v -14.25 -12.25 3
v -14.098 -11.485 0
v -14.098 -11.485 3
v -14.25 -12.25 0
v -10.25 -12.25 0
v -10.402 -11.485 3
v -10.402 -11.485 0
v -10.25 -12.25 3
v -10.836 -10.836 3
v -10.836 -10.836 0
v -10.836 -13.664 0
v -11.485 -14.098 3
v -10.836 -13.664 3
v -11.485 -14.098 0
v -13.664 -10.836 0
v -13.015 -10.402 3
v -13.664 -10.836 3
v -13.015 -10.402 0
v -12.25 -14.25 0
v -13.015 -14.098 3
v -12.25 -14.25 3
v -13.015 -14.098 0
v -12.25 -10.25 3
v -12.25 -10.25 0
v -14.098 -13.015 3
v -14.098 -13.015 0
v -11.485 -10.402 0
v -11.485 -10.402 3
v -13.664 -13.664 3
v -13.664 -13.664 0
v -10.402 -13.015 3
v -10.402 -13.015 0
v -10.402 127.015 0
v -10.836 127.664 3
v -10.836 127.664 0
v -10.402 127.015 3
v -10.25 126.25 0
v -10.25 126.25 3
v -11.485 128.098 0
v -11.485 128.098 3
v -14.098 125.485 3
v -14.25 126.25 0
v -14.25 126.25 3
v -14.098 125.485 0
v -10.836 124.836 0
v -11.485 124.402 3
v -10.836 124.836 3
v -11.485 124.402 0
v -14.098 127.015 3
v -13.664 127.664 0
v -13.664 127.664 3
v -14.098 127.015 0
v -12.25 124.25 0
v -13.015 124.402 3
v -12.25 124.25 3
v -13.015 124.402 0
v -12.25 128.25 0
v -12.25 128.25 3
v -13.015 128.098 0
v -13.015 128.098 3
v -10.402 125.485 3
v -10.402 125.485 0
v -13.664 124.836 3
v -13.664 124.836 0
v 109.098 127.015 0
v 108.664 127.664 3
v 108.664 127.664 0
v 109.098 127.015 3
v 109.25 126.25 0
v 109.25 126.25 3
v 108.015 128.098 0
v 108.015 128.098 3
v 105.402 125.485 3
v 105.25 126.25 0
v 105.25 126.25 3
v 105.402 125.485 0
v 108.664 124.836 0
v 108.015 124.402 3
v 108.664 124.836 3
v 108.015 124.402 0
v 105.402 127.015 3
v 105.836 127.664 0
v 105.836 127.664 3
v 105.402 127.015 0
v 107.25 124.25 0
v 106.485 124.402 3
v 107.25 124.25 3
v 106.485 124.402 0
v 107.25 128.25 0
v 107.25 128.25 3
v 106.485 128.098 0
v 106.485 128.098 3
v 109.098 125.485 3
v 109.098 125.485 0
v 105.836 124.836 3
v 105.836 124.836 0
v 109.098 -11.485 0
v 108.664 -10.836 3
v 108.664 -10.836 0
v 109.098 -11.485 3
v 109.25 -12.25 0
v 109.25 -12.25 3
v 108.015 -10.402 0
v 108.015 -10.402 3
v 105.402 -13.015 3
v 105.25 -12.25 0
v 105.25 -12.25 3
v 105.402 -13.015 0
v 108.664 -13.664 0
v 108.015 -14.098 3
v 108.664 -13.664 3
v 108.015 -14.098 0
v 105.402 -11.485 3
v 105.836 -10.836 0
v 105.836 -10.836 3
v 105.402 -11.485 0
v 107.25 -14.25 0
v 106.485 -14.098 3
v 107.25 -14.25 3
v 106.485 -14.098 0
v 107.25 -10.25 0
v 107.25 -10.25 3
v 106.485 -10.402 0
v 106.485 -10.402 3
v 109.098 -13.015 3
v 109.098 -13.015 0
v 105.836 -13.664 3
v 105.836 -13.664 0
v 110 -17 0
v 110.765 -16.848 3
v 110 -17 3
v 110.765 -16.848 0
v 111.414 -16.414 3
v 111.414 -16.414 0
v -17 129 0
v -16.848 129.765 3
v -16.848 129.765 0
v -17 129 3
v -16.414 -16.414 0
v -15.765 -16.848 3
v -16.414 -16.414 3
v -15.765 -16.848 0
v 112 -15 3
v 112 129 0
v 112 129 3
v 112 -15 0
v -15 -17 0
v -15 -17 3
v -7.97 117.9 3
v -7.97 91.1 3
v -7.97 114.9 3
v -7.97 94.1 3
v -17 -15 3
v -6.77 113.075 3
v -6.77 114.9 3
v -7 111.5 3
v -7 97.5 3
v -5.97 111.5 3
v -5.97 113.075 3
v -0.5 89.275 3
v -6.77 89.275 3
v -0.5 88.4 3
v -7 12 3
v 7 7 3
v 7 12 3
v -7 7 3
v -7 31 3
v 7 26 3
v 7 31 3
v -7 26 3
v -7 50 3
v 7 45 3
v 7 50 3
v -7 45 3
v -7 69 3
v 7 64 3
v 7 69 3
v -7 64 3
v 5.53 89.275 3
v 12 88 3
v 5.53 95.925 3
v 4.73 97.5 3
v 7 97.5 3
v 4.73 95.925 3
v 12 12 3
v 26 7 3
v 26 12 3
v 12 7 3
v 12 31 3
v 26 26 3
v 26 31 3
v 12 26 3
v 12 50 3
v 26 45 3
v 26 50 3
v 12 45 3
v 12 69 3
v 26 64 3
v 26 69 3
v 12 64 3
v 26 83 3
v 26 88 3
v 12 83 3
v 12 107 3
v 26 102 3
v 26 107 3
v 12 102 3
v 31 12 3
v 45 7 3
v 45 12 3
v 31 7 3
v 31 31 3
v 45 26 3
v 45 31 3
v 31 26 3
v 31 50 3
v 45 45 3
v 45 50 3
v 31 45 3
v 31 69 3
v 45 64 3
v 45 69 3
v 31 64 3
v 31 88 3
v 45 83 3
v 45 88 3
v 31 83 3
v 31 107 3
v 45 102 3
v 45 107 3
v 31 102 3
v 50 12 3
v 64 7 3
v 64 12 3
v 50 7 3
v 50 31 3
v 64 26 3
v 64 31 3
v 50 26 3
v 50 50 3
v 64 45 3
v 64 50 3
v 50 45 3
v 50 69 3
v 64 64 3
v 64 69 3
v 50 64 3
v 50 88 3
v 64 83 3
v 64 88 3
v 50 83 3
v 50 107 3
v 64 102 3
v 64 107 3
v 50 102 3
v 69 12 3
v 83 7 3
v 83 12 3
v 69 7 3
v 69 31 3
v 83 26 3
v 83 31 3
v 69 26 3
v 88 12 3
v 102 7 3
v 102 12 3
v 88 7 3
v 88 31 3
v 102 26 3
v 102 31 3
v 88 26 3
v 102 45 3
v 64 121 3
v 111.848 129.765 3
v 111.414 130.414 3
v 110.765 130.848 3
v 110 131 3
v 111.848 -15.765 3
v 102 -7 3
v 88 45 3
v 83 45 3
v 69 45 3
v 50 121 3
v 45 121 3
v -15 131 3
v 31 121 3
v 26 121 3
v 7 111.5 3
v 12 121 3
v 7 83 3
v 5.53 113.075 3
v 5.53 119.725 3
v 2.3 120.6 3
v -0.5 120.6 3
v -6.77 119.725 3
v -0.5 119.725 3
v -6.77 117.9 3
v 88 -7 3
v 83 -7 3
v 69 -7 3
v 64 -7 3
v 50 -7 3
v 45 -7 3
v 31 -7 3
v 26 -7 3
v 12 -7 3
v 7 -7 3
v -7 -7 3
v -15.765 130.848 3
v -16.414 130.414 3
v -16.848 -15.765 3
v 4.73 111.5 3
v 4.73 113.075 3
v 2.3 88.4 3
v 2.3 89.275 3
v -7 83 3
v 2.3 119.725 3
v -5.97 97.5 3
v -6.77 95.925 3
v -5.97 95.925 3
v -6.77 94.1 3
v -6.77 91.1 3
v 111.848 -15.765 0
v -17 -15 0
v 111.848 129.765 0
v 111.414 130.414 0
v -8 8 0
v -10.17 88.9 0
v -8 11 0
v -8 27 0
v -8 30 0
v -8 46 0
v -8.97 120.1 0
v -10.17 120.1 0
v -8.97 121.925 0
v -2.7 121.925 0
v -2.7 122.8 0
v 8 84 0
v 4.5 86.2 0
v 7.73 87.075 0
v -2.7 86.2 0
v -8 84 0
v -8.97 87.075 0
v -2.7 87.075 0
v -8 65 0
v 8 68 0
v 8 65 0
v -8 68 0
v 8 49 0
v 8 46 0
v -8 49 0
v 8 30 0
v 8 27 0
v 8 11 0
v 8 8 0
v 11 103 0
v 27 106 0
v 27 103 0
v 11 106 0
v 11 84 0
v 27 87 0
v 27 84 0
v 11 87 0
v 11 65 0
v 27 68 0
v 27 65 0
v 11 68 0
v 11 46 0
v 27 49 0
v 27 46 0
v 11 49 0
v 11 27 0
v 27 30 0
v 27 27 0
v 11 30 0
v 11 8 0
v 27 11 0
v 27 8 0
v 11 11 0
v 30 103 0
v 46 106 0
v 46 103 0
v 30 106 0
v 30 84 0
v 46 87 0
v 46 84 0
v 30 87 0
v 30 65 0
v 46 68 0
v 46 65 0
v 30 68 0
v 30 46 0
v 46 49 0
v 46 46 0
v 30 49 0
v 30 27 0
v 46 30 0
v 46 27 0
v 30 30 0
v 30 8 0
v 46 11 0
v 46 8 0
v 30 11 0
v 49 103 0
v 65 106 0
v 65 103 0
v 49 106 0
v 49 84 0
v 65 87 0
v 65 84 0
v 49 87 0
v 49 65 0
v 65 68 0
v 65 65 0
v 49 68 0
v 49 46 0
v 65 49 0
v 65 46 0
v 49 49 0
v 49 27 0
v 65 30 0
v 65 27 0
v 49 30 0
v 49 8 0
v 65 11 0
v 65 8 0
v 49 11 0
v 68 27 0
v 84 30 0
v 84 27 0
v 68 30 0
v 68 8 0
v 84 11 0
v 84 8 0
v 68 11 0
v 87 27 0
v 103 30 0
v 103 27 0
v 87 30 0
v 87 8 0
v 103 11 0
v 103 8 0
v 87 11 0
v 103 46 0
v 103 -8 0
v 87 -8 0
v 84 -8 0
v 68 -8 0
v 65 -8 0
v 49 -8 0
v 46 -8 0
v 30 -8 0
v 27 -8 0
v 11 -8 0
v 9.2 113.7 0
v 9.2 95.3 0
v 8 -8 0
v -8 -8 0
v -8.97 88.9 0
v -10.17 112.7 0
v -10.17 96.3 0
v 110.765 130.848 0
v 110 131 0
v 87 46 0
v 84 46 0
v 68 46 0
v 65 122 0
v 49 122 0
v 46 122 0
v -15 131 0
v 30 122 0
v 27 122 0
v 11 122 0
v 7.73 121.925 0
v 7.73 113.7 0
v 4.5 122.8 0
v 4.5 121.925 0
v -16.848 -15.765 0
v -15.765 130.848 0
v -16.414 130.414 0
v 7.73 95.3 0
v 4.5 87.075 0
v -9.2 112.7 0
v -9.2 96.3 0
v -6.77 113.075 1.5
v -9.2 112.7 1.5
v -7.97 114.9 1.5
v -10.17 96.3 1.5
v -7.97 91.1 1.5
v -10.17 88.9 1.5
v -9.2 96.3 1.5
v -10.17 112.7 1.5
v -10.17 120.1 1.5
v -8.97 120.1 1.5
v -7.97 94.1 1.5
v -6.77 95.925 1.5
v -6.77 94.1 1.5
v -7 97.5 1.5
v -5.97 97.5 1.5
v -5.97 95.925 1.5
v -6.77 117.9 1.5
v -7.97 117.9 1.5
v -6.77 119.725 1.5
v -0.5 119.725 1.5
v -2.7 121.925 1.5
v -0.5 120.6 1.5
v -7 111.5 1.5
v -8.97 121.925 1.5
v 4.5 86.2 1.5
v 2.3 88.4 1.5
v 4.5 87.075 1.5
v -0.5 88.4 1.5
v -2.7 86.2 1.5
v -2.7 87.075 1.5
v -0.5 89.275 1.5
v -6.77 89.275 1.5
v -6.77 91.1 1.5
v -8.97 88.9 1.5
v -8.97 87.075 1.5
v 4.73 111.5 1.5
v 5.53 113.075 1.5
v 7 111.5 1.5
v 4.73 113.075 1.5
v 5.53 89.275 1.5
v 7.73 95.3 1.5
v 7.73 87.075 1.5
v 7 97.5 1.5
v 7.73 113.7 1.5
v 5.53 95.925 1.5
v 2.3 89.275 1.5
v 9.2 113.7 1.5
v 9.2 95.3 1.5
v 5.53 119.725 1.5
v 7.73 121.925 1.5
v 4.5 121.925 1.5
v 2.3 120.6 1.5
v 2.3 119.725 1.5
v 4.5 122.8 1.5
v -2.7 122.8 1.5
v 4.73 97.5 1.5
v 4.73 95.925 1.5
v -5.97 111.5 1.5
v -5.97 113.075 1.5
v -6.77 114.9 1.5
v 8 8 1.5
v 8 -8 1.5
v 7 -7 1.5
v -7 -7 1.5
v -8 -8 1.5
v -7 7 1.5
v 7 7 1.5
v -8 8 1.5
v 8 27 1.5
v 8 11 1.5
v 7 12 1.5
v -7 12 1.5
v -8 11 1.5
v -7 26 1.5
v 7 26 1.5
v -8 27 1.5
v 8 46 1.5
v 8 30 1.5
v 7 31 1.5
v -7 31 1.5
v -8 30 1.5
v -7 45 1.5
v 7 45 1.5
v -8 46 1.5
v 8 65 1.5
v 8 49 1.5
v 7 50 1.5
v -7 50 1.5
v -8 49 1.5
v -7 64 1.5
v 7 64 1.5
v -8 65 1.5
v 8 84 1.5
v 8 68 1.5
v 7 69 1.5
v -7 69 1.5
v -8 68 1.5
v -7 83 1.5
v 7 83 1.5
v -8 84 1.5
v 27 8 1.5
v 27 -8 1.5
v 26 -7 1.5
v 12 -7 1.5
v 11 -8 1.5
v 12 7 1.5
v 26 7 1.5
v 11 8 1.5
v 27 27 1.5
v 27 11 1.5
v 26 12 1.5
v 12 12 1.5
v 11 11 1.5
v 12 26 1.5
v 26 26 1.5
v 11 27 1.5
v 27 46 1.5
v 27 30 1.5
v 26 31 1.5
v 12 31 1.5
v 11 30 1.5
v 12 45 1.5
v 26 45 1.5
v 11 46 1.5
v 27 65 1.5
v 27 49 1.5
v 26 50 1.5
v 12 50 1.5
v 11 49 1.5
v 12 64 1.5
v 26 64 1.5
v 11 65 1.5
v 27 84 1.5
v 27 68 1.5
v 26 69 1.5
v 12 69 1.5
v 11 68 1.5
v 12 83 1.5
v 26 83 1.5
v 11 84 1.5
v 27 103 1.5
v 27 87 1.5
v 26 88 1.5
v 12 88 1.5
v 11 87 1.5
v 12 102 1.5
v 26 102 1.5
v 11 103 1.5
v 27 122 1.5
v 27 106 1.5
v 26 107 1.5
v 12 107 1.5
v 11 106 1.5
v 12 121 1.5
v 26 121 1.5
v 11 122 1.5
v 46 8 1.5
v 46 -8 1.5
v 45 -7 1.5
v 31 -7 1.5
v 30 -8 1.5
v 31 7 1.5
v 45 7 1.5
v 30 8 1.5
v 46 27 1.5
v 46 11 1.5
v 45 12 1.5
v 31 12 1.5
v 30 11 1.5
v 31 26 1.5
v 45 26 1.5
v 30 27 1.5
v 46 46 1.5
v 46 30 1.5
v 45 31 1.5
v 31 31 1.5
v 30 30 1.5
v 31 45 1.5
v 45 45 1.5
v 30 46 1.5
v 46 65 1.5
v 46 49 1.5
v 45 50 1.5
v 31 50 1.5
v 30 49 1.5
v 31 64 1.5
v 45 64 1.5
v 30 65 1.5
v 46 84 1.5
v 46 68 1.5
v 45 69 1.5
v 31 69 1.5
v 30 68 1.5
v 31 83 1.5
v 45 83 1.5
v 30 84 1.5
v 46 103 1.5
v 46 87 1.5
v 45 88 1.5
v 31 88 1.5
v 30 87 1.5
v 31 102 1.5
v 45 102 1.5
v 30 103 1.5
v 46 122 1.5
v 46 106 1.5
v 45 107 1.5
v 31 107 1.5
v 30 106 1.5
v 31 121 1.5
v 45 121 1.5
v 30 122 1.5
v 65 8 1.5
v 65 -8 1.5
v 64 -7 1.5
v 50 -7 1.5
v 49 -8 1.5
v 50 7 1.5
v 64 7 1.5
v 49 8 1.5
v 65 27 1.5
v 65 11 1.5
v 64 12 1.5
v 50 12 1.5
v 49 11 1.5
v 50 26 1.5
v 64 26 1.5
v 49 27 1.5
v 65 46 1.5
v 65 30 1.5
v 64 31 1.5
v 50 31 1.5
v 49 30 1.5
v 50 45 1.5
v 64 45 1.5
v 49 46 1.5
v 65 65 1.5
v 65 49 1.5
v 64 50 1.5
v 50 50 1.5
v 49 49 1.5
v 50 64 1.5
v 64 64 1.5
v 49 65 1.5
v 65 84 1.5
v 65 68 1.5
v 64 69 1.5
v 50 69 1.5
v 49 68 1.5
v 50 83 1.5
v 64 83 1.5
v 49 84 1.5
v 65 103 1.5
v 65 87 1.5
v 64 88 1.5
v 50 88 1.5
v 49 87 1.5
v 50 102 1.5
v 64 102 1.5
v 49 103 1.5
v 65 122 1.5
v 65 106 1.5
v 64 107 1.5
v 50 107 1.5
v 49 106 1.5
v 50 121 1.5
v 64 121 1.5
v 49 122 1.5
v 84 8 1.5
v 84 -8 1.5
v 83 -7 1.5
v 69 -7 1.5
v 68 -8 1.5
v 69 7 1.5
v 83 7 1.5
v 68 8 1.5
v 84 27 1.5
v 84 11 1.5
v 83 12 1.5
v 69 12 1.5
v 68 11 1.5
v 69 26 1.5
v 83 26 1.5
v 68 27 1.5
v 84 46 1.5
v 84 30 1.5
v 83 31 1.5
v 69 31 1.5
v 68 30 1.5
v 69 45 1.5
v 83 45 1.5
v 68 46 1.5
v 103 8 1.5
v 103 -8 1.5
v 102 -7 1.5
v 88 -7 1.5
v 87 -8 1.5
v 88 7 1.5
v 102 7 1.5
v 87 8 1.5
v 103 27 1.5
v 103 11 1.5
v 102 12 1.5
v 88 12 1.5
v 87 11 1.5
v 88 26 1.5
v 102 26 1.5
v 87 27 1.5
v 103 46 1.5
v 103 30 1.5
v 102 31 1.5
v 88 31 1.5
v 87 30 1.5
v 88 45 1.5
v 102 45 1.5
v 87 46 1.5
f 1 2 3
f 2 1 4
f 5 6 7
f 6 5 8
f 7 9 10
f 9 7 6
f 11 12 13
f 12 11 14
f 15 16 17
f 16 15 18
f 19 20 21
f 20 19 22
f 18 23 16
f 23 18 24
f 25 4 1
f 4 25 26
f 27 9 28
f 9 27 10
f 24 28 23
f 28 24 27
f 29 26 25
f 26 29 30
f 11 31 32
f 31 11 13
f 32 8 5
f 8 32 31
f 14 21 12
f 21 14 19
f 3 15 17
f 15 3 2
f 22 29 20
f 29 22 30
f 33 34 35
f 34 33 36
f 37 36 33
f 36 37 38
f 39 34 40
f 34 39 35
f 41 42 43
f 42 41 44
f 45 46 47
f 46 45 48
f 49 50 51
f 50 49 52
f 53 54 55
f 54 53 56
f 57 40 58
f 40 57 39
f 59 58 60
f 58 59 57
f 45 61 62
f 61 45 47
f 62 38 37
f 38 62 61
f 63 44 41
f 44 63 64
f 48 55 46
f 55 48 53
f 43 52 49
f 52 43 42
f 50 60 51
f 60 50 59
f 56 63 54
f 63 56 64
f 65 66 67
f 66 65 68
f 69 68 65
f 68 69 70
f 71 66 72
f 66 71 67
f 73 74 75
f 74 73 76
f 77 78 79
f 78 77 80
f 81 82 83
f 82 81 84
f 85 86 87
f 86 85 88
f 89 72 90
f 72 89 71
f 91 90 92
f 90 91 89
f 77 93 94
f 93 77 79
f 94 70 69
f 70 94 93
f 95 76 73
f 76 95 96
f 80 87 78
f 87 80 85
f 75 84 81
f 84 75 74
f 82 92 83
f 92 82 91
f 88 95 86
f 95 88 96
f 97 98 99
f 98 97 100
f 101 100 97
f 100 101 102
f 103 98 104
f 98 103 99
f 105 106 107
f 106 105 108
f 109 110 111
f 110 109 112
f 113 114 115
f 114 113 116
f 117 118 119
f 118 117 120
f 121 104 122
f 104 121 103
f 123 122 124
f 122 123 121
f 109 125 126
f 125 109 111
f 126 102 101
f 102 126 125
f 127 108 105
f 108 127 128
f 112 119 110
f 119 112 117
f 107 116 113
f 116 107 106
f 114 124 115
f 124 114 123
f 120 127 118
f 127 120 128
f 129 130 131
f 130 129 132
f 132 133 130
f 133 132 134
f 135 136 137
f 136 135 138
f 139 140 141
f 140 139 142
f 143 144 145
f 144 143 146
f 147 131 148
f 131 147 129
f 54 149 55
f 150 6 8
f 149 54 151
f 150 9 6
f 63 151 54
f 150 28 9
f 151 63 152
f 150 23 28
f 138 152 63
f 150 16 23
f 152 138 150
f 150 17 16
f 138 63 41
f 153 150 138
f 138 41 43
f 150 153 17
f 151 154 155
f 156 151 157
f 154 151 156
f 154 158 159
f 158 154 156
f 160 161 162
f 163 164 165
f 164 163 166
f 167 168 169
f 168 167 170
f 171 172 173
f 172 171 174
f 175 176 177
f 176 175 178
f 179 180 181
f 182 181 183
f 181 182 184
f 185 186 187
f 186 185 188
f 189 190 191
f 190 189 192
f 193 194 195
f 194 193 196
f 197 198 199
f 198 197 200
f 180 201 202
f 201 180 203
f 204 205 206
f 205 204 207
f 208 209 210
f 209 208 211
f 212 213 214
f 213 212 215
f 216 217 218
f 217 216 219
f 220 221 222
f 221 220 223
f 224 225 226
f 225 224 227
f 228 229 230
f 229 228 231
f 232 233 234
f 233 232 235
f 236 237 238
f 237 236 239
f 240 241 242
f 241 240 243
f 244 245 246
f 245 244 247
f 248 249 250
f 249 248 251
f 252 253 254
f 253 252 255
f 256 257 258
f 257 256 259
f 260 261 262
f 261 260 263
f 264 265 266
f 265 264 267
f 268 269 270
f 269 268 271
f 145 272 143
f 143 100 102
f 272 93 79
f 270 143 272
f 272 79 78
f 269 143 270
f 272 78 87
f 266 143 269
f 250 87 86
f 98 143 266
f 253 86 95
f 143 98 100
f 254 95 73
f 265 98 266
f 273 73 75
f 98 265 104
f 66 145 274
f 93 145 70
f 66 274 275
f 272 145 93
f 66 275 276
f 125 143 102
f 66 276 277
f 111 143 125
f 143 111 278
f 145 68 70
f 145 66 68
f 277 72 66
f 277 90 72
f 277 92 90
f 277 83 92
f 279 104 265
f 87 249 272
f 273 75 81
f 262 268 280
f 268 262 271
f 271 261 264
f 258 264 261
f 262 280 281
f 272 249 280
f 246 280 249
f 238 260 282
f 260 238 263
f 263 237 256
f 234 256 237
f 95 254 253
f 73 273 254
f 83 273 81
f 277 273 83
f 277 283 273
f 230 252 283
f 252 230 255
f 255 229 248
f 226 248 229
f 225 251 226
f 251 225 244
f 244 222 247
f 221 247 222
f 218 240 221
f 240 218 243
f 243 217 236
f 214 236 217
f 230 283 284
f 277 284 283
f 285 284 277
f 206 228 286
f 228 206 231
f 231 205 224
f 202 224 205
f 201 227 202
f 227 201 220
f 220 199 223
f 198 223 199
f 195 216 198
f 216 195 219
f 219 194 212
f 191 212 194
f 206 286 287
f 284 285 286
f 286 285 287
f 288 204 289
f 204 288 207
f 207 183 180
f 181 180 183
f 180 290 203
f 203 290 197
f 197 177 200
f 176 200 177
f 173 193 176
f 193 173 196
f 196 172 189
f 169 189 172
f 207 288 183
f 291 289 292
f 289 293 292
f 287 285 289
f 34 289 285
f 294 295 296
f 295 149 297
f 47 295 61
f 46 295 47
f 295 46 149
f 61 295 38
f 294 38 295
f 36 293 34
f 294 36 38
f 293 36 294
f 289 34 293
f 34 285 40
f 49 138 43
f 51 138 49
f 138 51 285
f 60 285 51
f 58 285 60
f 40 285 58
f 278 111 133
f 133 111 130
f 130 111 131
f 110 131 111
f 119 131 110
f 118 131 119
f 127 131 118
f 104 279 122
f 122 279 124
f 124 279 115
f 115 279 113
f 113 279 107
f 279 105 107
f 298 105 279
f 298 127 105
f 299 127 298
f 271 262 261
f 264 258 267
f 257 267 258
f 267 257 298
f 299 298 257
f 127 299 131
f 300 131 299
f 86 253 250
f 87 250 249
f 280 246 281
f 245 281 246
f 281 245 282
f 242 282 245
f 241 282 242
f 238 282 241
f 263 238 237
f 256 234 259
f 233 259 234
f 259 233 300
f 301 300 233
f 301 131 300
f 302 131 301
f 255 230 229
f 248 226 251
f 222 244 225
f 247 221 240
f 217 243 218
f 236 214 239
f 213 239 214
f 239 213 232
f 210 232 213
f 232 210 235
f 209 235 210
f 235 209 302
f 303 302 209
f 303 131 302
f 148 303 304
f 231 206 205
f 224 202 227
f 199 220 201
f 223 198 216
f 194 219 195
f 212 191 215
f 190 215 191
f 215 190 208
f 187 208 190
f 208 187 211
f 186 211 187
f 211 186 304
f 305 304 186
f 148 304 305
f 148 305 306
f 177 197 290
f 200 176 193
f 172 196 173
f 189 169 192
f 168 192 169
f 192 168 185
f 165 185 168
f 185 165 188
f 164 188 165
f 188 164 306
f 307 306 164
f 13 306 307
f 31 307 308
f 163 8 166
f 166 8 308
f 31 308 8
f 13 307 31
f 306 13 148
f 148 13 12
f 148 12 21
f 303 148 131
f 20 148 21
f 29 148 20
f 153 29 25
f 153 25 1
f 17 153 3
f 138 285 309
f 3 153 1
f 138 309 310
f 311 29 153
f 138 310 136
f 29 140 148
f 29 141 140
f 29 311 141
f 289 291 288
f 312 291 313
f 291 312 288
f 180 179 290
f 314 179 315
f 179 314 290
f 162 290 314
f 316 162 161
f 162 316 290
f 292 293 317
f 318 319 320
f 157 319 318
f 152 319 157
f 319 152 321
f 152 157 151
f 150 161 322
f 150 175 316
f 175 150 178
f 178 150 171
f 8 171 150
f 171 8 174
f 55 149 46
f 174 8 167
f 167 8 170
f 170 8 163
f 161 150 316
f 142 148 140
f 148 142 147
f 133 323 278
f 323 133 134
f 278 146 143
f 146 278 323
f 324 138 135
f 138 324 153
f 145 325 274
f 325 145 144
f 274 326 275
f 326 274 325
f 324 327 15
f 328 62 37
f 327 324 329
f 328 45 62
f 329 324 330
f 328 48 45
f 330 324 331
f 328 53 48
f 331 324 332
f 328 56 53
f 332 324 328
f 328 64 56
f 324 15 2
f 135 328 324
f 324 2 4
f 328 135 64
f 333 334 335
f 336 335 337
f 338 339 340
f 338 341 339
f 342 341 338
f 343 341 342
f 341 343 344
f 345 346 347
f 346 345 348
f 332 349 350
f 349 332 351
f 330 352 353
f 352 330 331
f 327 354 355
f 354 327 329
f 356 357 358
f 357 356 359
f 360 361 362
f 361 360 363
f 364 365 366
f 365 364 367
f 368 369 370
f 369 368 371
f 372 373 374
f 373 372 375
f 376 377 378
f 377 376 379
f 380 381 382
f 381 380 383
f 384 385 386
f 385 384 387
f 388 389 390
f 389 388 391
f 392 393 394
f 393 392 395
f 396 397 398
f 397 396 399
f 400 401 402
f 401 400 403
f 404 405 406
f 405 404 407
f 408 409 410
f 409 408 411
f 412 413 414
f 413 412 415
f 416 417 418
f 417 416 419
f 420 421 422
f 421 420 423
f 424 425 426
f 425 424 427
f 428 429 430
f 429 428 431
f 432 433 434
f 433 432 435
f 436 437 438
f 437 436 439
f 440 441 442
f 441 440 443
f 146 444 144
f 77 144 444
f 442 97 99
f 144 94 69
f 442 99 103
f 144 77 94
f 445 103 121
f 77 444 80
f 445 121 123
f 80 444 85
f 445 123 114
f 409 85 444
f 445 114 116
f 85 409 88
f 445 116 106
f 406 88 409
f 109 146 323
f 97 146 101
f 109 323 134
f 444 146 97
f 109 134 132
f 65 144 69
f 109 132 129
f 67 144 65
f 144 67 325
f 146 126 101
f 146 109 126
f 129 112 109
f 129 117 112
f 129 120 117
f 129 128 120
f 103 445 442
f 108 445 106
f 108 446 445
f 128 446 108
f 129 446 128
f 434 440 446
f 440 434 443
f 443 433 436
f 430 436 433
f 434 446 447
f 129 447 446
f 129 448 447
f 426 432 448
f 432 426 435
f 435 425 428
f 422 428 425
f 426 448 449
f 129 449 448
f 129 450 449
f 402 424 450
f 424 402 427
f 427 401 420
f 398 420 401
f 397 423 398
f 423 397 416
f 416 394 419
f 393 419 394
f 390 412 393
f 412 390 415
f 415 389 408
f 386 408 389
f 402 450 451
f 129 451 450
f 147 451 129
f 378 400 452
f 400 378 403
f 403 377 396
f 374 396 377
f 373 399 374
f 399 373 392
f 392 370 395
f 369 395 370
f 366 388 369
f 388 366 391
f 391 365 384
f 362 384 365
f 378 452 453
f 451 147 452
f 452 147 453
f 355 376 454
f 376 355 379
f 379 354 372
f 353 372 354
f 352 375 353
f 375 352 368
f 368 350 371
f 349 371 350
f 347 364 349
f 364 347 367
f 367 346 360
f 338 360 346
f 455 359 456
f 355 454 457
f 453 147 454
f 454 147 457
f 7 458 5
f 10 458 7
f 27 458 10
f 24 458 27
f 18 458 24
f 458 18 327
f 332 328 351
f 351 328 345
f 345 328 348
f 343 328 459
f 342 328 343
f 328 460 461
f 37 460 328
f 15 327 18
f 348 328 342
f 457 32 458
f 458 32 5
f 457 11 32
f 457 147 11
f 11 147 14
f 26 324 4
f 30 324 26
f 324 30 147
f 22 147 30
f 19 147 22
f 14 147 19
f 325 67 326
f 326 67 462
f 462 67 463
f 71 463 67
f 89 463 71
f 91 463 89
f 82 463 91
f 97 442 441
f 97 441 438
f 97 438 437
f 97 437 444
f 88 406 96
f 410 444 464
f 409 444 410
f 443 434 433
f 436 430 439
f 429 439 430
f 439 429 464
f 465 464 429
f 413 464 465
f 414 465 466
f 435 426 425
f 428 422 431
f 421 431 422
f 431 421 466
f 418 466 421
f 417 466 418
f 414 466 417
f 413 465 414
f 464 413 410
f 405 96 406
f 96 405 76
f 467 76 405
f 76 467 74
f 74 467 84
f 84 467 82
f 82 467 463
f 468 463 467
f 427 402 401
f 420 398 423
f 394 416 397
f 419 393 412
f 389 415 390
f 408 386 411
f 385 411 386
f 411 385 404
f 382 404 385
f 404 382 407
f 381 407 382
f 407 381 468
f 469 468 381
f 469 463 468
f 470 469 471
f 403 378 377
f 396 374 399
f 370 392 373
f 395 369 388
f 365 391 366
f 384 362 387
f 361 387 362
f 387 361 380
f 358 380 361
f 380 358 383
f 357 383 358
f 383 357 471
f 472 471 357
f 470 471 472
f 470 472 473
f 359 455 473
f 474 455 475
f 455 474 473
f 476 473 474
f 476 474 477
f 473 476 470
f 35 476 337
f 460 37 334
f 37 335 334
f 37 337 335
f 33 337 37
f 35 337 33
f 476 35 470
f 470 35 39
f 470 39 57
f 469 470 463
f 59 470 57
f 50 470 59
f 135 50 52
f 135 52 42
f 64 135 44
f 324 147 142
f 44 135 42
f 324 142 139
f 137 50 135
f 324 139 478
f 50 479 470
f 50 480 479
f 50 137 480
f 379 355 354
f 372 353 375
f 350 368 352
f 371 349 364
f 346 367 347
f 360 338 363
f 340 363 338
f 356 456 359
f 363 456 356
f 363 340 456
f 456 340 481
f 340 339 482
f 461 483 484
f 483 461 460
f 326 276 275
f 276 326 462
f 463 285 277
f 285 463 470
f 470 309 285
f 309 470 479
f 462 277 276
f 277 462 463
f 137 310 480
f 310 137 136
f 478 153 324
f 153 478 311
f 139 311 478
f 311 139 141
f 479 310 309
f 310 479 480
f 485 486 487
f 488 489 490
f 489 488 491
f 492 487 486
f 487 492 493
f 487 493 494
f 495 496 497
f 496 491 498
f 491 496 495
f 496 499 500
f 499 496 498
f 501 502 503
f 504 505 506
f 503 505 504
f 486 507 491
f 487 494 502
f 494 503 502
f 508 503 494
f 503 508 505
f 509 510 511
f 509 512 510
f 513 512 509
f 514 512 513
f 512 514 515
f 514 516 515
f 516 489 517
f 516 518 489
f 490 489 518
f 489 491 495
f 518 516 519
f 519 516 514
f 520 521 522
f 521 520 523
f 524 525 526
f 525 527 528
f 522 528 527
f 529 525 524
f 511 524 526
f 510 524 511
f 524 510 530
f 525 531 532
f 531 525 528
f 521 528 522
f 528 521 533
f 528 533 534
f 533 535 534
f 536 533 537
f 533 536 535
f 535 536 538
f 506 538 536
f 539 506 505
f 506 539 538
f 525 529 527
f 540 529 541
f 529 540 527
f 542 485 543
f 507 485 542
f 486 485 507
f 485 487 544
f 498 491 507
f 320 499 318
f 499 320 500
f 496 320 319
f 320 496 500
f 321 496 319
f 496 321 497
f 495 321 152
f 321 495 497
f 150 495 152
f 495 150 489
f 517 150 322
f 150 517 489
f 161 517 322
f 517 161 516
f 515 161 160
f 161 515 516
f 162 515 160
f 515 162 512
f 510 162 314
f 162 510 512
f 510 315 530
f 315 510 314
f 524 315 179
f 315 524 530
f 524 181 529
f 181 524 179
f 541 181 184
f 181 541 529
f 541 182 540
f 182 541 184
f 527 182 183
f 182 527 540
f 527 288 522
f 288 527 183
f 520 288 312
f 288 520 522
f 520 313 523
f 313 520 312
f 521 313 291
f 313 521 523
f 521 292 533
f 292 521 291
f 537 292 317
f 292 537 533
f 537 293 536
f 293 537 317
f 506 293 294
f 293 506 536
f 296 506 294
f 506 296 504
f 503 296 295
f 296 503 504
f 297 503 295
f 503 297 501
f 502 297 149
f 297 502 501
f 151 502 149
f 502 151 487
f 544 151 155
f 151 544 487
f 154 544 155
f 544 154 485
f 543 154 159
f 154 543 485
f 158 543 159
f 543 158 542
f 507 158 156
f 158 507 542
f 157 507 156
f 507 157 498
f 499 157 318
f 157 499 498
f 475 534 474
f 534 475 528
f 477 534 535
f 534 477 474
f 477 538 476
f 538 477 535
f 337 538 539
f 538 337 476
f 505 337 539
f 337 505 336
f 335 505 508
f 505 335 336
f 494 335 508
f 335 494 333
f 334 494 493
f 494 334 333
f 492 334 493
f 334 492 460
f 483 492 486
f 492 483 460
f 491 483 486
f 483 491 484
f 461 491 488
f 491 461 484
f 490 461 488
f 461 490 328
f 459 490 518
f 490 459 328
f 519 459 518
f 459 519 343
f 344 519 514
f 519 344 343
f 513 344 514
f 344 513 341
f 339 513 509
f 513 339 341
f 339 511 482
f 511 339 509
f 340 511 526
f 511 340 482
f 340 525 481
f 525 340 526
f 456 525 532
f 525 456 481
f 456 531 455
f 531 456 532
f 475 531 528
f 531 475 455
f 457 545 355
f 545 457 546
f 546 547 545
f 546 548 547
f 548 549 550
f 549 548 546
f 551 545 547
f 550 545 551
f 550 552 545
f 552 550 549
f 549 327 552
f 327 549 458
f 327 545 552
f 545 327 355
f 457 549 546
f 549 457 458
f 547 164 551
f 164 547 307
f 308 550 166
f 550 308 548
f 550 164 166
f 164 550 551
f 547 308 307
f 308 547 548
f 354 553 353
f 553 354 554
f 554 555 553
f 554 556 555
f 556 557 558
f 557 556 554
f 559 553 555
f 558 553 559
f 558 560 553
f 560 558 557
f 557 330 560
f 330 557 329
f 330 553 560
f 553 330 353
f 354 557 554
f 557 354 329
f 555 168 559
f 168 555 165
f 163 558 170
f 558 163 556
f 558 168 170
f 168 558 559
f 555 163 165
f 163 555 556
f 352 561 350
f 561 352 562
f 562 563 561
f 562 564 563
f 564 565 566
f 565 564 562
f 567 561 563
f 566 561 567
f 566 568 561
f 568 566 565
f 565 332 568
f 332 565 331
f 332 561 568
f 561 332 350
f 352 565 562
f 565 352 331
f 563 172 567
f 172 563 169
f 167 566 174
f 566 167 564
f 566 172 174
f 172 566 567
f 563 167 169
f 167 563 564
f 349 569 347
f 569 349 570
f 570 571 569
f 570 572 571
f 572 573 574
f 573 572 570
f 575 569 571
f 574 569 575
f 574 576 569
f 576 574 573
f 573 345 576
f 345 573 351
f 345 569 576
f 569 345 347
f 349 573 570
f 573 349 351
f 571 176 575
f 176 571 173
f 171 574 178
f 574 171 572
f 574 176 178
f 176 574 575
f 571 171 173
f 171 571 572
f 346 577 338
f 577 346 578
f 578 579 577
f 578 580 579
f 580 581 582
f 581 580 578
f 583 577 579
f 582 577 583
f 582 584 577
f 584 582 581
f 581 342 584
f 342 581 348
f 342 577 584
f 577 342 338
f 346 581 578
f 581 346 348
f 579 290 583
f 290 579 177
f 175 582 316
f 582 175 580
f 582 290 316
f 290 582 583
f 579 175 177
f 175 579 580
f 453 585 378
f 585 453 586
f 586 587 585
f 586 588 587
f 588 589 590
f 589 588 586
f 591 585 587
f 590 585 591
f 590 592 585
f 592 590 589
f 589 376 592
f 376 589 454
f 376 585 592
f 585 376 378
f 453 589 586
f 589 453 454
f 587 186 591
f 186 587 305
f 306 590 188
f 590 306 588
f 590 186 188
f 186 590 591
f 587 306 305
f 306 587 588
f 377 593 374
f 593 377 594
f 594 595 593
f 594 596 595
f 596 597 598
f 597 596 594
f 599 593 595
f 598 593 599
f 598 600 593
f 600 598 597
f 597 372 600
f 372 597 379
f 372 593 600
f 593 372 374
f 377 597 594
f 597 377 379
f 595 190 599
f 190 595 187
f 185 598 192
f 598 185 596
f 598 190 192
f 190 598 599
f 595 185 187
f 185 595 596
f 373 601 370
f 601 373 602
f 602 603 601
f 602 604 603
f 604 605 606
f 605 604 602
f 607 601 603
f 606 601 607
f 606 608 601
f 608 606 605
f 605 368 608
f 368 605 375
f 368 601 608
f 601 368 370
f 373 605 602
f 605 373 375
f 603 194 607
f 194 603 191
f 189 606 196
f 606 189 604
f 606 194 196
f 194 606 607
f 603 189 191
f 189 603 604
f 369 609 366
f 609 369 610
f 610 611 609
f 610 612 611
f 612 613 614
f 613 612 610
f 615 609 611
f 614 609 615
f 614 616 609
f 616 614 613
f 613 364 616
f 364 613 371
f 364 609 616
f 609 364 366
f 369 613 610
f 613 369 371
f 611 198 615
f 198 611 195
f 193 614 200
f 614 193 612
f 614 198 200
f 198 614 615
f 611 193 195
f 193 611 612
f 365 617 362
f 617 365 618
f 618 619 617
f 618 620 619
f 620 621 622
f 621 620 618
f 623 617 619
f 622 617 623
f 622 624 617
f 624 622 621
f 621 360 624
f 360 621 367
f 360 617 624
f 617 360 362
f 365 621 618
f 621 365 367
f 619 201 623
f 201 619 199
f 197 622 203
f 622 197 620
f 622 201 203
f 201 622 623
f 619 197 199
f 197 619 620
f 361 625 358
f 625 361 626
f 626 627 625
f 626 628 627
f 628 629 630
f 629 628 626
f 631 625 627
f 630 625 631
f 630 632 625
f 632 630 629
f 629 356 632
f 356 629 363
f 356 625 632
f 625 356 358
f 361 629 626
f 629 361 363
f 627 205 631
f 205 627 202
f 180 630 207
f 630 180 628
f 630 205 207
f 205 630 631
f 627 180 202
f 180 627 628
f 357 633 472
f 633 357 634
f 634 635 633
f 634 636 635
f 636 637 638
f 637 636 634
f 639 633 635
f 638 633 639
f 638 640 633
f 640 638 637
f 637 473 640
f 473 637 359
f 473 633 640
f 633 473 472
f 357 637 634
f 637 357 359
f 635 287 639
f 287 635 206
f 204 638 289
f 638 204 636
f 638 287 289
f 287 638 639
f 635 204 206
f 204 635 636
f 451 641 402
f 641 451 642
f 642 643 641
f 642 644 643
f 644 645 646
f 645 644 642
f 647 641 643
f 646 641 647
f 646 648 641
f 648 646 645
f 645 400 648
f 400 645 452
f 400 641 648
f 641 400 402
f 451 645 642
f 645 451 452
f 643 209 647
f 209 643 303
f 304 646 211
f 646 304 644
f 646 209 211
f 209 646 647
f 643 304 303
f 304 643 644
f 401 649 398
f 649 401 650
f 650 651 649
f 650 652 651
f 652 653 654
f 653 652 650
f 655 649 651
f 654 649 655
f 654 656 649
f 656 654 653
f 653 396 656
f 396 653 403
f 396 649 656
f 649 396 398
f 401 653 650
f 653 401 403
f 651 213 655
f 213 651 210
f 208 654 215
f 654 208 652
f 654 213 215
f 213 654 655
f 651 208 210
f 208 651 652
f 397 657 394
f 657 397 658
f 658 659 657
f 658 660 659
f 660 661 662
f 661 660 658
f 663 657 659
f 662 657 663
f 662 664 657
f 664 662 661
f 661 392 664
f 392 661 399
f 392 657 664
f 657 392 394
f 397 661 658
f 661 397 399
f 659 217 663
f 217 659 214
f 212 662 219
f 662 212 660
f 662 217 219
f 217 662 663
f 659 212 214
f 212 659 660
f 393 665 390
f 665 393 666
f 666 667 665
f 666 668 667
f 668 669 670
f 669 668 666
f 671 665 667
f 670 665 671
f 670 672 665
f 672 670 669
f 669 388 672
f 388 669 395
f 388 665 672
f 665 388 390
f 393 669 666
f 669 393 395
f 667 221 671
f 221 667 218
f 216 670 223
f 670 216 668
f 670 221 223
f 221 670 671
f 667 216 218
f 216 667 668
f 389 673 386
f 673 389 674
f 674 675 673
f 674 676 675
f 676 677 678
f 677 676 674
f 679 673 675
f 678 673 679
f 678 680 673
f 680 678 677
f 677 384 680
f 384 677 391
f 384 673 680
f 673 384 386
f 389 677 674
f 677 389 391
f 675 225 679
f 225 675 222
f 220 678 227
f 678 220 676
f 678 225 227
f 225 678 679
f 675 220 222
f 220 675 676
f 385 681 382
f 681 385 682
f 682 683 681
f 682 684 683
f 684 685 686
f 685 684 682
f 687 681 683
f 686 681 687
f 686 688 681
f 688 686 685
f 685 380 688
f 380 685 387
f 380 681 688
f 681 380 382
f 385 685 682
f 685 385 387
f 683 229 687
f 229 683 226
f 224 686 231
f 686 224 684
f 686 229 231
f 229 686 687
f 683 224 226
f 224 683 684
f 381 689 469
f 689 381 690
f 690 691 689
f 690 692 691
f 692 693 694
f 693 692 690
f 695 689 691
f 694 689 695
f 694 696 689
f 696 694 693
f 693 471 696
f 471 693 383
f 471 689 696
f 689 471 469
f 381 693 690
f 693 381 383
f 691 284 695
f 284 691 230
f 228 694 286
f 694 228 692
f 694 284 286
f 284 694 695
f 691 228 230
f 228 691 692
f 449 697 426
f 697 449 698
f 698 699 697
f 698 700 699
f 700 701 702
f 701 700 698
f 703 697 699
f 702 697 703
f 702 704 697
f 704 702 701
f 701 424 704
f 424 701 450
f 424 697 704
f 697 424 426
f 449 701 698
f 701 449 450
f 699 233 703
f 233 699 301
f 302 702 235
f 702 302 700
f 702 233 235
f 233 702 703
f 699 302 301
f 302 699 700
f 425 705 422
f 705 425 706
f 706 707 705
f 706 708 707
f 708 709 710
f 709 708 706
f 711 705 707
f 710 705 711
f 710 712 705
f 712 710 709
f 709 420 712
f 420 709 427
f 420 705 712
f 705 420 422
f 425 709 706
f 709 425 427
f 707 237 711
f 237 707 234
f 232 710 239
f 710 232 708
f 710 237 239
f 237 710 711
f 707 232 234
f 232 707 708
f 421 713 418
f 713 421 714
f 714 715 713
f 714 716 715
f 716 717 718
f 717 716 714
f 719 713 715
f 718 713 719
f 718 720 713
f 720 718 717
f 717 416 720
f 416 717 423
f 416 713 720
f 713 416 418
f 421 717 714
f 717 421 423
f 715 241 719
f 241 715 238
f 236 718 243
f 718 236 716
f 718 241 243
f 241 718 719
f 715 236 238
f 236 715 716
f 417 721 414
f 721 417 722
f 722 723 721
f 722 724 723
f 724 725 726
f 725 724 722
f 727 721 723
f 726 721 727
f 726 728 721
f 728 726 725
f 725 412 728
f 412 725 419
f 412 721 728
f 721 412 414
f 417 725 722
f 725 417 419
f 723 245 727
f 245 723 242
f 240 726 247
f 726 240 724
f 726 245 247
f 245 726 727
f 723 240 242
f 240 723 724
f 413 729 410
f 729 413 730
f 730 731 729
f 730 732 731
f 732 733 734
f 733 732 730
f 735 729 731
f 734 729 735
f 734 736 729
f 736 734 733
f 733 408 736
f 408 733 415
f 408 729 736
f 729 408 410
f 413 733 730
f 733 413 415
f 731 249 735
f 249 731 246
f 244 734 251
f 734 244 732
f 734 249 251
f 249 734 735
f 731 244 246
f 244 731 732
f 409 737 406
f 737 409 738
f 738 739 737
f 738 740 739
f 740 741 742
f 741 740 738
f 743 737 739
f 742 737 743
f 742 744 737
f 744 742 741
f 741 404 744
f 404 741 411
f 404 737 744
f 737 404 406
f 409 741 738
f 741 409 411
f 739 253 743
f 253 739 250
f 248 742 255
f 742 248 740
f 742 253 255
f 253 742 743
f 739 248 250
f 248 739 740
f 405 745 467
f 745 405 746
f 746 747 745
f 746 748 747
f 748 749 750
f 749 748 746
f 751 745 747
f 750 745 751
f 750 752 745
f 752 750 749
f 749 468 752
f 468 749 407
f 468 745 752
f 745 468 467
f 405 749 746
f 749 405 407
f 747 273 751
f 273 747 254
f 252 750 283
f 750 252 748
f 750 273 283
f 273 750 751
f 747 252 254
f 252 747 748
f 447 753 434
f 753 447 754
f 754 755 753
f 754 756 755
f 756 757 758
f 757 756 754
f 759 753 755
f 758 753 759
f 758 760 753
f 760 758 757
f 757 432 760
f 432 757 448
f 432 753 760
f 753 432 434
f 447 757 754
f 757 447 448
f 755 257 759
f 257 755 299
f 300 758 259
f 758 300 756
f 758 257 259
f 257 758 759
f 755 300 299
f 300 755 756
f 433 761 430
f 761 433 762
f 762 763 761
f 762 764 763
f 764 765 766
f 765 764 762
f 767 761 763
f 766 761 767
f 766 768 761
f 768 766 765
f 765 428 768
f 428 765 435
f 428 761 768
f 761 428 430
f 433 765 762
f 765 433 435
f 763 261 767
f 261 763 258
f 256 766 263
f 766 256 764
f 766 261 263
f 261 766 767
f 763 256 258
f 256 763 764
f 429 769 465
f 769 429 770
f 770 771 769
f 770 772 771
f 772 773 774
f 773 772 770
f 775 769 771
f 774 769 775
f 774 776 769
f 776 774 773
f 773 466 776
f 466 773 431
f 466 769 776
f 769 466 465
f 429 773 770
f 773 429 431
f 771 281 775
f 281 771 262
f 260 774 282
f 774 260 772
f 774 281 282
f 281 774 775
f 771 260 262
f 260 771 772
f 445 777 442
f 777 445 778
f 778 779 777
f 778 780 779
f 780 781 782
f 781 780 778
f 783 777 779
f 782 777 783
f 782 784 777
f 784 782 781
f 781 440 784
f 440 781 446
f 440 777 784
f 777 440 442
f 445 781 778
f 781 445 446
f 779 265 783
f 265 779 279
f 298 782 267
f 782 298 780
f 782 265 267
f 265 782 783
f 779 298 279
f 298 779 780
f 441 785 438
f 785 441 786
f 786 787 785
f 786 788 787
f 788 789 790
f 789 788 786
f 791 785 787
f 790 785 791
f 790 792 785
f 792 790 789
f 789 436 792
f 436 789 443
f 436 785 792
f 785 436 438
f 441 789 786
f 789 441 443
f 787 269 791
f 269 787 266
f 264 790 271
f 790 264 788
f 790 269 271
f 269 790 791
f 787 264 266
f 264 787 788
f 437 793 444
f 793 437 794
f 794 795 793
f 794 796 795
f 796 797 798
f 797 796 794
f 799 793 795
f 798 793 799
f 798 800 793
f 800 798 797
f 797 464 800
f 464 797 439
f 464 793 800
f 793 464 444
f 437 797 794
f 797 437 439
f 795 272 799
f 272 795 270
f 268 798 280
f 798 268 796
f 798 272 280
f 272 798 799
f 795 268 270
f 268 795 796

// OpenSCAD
// don't change these
switch_x = 14;
switch_y = switch_x;
pitch = 19;
u = pitch;
//clip_thickness = 1.524; //mx
clip_thickness = 1.5; //gateron
clip_length = 2;

// change this for the layer height you want to print at (0.2 or 0.16 recommended)
layer_height = 0.2;

//plate size
plate_thickness = 3;//currently only 3mm is supported
rows = 6;
cols = 7;
outer_padding = 5.5;
rounding = 2;
hole_size = 4; // must be less that outer_padding


switch_positions = [
                    //row1
                    [0,0,0],
                    [0,1*u,0],
                    [0,2*u,0],
                    [0,3*u,0],
                    [0,4*u,0],
                    //stab

                    //row2
                    [1*u,0,0],
                    [1*u,1*u,0],
                    [1*u,2*u,0],
                    [1*u,3*u,0],
                    [1*u,4*u,0],
                    [1*u,5*u,0],
                    [1*u,6*u,0],

                    //row3
                    [2*u,0,0],
                    [2*u,1*u,0],
                    [2*u,2*u,0],
                    [2*u,3*u,0],
                    [2*u,4*u,0],
                    [2*u,5*u,0],
                    [2*u,6*u,0],

                    //row4
                    [3*u,0,0],
                    [3*u,1*u,0],
                    [3*u,2*u,0],
                    [3*u,3*u,0],
                    [3*u,4*u,0],
                    [3*u,5*u,0],
                    [3*u,6*u,0],

                    //row5
                    [4*u,0,0],
                    [4*u,1*u,0],
                    [4*u,2*u,0],

                    //row6
                    [5*u,0,0],
                    [5*u,1*u,0],
                    [5*u,2*u,0],

                    ];

2u_stabilised_switch_positions = [
                    [0*u,5.5*u,0]
                    ];
//functions
module switch_hole(position){
    translate(position)
    translate([0,0,(plate_thickness-clip_thickness)/2])
    union(){
        //clip
        cube([switch_x+clip_length, switch_y+clip_length, plate_thickness-clip_thickness],center=true);
        //rim
        translate([0,0,plate_thickness-clip_thickness])cube([switch_x, switch_y, clip_thickness],center=true);
    }
}

module 2u_stabilised_key_hole(position){
    clip_points = [
        [-0.50,32.2/2],
        [2.3,32.2/2],
        [2.3,30.45/2],
        [5.53,30.45/2],
        [5.53,17.15/2],
        [4.73,17.15/2],
        [4.73,14/2],
        [7,14/2],
        [7,0],

        [-7,0],
        [-7,14/2],
        [-5.97,14/2],
        [-5.97,17.15/2],
        [-6.77,17.15/2],
        [-6.77,20.80/2],
        [-7.97,20.80/2],
        [-7.97,26.80/2],
        [-6.77,26.80/2],
        [-6.77,30.45/2],
        [-0.5,30.45/2]
    ];

    translate(position)
    union(){
        //clip
        translate([0,0,plate_thickness-(clip_thickness/2)])
        linear_extrude(clip_thickness,center=true)
        union(){
            rotate([180,0,0])polygon(clip_points);
            polygon(clip_points);
        }

        //rim
        translate([0,0,(plate_thickness-clip_thickness)/2])
        linear_extrude(plate_thickness-clip_thickness,center=true)
        union(){
            rotate([180,0,0])offset(delta=clip_length+layer_height){polygon(clip_points);}
            offset(delta=clip_length+layer_height){polygon(clip_points);}
        }
    }
}

module plate_gen(){
    points = [
        [.5*u-outer_padding,.5*u-outer_padding,0],
        [.5*u-outer_padding,(cols+.5)*u+outer_padding,0],
        [(rows+.5)*u+outer_padding,(cols+.5)*u+outer_padding,0],
        [(rows+.5)*u+outer_padding,.5*u-outer_padding,0],
        ];
    holes = [
        [.5*u-outer_padding/2,.5*u-outer_padding/2,0],
        [.5*u-outer_padding/2,(cols+.5)*u+outer_padding/2,0],
        [(rows+.5)*u+outer_padding/2,(cols+.5)*u+outer_padding/2,0],
        [(rows+.5)*u+outer_padding/2,.5*u-outer_padding/2,0],
        ];
    difference(){
        hull(){
        for(i=points){
            translate(i)cylinder(r1=rounding, r2=rounding, h=plate_thickness, $fn=16);
        }
        }
        union(){
            for(i=holes){
                translate(i)cylinder(r1=hole_size/2, r2=hole_size/2, h=plate_thickness*4, $fn=16, center=true);
            }
        }
    }
}

// actually generating the plate


//minkowski(){ // uncomment for rounded edges
difference(){
    //plate
    translate([-1*u,-1*u,0])plate_gen();
    
    // cutouts for switches and stabs
    union(){
        //stabs from position list
        for(i=2u_stabilised_switch_positions){
            2u_stabilised_key_hole(i);
        }
        

        for(i=switch_positions){
            switch_hole(i);
        }
    }
}
//sphere(2*layer_height,$fn=32); // uncomment for rounded edges
//} // uncomment for rounded edges
